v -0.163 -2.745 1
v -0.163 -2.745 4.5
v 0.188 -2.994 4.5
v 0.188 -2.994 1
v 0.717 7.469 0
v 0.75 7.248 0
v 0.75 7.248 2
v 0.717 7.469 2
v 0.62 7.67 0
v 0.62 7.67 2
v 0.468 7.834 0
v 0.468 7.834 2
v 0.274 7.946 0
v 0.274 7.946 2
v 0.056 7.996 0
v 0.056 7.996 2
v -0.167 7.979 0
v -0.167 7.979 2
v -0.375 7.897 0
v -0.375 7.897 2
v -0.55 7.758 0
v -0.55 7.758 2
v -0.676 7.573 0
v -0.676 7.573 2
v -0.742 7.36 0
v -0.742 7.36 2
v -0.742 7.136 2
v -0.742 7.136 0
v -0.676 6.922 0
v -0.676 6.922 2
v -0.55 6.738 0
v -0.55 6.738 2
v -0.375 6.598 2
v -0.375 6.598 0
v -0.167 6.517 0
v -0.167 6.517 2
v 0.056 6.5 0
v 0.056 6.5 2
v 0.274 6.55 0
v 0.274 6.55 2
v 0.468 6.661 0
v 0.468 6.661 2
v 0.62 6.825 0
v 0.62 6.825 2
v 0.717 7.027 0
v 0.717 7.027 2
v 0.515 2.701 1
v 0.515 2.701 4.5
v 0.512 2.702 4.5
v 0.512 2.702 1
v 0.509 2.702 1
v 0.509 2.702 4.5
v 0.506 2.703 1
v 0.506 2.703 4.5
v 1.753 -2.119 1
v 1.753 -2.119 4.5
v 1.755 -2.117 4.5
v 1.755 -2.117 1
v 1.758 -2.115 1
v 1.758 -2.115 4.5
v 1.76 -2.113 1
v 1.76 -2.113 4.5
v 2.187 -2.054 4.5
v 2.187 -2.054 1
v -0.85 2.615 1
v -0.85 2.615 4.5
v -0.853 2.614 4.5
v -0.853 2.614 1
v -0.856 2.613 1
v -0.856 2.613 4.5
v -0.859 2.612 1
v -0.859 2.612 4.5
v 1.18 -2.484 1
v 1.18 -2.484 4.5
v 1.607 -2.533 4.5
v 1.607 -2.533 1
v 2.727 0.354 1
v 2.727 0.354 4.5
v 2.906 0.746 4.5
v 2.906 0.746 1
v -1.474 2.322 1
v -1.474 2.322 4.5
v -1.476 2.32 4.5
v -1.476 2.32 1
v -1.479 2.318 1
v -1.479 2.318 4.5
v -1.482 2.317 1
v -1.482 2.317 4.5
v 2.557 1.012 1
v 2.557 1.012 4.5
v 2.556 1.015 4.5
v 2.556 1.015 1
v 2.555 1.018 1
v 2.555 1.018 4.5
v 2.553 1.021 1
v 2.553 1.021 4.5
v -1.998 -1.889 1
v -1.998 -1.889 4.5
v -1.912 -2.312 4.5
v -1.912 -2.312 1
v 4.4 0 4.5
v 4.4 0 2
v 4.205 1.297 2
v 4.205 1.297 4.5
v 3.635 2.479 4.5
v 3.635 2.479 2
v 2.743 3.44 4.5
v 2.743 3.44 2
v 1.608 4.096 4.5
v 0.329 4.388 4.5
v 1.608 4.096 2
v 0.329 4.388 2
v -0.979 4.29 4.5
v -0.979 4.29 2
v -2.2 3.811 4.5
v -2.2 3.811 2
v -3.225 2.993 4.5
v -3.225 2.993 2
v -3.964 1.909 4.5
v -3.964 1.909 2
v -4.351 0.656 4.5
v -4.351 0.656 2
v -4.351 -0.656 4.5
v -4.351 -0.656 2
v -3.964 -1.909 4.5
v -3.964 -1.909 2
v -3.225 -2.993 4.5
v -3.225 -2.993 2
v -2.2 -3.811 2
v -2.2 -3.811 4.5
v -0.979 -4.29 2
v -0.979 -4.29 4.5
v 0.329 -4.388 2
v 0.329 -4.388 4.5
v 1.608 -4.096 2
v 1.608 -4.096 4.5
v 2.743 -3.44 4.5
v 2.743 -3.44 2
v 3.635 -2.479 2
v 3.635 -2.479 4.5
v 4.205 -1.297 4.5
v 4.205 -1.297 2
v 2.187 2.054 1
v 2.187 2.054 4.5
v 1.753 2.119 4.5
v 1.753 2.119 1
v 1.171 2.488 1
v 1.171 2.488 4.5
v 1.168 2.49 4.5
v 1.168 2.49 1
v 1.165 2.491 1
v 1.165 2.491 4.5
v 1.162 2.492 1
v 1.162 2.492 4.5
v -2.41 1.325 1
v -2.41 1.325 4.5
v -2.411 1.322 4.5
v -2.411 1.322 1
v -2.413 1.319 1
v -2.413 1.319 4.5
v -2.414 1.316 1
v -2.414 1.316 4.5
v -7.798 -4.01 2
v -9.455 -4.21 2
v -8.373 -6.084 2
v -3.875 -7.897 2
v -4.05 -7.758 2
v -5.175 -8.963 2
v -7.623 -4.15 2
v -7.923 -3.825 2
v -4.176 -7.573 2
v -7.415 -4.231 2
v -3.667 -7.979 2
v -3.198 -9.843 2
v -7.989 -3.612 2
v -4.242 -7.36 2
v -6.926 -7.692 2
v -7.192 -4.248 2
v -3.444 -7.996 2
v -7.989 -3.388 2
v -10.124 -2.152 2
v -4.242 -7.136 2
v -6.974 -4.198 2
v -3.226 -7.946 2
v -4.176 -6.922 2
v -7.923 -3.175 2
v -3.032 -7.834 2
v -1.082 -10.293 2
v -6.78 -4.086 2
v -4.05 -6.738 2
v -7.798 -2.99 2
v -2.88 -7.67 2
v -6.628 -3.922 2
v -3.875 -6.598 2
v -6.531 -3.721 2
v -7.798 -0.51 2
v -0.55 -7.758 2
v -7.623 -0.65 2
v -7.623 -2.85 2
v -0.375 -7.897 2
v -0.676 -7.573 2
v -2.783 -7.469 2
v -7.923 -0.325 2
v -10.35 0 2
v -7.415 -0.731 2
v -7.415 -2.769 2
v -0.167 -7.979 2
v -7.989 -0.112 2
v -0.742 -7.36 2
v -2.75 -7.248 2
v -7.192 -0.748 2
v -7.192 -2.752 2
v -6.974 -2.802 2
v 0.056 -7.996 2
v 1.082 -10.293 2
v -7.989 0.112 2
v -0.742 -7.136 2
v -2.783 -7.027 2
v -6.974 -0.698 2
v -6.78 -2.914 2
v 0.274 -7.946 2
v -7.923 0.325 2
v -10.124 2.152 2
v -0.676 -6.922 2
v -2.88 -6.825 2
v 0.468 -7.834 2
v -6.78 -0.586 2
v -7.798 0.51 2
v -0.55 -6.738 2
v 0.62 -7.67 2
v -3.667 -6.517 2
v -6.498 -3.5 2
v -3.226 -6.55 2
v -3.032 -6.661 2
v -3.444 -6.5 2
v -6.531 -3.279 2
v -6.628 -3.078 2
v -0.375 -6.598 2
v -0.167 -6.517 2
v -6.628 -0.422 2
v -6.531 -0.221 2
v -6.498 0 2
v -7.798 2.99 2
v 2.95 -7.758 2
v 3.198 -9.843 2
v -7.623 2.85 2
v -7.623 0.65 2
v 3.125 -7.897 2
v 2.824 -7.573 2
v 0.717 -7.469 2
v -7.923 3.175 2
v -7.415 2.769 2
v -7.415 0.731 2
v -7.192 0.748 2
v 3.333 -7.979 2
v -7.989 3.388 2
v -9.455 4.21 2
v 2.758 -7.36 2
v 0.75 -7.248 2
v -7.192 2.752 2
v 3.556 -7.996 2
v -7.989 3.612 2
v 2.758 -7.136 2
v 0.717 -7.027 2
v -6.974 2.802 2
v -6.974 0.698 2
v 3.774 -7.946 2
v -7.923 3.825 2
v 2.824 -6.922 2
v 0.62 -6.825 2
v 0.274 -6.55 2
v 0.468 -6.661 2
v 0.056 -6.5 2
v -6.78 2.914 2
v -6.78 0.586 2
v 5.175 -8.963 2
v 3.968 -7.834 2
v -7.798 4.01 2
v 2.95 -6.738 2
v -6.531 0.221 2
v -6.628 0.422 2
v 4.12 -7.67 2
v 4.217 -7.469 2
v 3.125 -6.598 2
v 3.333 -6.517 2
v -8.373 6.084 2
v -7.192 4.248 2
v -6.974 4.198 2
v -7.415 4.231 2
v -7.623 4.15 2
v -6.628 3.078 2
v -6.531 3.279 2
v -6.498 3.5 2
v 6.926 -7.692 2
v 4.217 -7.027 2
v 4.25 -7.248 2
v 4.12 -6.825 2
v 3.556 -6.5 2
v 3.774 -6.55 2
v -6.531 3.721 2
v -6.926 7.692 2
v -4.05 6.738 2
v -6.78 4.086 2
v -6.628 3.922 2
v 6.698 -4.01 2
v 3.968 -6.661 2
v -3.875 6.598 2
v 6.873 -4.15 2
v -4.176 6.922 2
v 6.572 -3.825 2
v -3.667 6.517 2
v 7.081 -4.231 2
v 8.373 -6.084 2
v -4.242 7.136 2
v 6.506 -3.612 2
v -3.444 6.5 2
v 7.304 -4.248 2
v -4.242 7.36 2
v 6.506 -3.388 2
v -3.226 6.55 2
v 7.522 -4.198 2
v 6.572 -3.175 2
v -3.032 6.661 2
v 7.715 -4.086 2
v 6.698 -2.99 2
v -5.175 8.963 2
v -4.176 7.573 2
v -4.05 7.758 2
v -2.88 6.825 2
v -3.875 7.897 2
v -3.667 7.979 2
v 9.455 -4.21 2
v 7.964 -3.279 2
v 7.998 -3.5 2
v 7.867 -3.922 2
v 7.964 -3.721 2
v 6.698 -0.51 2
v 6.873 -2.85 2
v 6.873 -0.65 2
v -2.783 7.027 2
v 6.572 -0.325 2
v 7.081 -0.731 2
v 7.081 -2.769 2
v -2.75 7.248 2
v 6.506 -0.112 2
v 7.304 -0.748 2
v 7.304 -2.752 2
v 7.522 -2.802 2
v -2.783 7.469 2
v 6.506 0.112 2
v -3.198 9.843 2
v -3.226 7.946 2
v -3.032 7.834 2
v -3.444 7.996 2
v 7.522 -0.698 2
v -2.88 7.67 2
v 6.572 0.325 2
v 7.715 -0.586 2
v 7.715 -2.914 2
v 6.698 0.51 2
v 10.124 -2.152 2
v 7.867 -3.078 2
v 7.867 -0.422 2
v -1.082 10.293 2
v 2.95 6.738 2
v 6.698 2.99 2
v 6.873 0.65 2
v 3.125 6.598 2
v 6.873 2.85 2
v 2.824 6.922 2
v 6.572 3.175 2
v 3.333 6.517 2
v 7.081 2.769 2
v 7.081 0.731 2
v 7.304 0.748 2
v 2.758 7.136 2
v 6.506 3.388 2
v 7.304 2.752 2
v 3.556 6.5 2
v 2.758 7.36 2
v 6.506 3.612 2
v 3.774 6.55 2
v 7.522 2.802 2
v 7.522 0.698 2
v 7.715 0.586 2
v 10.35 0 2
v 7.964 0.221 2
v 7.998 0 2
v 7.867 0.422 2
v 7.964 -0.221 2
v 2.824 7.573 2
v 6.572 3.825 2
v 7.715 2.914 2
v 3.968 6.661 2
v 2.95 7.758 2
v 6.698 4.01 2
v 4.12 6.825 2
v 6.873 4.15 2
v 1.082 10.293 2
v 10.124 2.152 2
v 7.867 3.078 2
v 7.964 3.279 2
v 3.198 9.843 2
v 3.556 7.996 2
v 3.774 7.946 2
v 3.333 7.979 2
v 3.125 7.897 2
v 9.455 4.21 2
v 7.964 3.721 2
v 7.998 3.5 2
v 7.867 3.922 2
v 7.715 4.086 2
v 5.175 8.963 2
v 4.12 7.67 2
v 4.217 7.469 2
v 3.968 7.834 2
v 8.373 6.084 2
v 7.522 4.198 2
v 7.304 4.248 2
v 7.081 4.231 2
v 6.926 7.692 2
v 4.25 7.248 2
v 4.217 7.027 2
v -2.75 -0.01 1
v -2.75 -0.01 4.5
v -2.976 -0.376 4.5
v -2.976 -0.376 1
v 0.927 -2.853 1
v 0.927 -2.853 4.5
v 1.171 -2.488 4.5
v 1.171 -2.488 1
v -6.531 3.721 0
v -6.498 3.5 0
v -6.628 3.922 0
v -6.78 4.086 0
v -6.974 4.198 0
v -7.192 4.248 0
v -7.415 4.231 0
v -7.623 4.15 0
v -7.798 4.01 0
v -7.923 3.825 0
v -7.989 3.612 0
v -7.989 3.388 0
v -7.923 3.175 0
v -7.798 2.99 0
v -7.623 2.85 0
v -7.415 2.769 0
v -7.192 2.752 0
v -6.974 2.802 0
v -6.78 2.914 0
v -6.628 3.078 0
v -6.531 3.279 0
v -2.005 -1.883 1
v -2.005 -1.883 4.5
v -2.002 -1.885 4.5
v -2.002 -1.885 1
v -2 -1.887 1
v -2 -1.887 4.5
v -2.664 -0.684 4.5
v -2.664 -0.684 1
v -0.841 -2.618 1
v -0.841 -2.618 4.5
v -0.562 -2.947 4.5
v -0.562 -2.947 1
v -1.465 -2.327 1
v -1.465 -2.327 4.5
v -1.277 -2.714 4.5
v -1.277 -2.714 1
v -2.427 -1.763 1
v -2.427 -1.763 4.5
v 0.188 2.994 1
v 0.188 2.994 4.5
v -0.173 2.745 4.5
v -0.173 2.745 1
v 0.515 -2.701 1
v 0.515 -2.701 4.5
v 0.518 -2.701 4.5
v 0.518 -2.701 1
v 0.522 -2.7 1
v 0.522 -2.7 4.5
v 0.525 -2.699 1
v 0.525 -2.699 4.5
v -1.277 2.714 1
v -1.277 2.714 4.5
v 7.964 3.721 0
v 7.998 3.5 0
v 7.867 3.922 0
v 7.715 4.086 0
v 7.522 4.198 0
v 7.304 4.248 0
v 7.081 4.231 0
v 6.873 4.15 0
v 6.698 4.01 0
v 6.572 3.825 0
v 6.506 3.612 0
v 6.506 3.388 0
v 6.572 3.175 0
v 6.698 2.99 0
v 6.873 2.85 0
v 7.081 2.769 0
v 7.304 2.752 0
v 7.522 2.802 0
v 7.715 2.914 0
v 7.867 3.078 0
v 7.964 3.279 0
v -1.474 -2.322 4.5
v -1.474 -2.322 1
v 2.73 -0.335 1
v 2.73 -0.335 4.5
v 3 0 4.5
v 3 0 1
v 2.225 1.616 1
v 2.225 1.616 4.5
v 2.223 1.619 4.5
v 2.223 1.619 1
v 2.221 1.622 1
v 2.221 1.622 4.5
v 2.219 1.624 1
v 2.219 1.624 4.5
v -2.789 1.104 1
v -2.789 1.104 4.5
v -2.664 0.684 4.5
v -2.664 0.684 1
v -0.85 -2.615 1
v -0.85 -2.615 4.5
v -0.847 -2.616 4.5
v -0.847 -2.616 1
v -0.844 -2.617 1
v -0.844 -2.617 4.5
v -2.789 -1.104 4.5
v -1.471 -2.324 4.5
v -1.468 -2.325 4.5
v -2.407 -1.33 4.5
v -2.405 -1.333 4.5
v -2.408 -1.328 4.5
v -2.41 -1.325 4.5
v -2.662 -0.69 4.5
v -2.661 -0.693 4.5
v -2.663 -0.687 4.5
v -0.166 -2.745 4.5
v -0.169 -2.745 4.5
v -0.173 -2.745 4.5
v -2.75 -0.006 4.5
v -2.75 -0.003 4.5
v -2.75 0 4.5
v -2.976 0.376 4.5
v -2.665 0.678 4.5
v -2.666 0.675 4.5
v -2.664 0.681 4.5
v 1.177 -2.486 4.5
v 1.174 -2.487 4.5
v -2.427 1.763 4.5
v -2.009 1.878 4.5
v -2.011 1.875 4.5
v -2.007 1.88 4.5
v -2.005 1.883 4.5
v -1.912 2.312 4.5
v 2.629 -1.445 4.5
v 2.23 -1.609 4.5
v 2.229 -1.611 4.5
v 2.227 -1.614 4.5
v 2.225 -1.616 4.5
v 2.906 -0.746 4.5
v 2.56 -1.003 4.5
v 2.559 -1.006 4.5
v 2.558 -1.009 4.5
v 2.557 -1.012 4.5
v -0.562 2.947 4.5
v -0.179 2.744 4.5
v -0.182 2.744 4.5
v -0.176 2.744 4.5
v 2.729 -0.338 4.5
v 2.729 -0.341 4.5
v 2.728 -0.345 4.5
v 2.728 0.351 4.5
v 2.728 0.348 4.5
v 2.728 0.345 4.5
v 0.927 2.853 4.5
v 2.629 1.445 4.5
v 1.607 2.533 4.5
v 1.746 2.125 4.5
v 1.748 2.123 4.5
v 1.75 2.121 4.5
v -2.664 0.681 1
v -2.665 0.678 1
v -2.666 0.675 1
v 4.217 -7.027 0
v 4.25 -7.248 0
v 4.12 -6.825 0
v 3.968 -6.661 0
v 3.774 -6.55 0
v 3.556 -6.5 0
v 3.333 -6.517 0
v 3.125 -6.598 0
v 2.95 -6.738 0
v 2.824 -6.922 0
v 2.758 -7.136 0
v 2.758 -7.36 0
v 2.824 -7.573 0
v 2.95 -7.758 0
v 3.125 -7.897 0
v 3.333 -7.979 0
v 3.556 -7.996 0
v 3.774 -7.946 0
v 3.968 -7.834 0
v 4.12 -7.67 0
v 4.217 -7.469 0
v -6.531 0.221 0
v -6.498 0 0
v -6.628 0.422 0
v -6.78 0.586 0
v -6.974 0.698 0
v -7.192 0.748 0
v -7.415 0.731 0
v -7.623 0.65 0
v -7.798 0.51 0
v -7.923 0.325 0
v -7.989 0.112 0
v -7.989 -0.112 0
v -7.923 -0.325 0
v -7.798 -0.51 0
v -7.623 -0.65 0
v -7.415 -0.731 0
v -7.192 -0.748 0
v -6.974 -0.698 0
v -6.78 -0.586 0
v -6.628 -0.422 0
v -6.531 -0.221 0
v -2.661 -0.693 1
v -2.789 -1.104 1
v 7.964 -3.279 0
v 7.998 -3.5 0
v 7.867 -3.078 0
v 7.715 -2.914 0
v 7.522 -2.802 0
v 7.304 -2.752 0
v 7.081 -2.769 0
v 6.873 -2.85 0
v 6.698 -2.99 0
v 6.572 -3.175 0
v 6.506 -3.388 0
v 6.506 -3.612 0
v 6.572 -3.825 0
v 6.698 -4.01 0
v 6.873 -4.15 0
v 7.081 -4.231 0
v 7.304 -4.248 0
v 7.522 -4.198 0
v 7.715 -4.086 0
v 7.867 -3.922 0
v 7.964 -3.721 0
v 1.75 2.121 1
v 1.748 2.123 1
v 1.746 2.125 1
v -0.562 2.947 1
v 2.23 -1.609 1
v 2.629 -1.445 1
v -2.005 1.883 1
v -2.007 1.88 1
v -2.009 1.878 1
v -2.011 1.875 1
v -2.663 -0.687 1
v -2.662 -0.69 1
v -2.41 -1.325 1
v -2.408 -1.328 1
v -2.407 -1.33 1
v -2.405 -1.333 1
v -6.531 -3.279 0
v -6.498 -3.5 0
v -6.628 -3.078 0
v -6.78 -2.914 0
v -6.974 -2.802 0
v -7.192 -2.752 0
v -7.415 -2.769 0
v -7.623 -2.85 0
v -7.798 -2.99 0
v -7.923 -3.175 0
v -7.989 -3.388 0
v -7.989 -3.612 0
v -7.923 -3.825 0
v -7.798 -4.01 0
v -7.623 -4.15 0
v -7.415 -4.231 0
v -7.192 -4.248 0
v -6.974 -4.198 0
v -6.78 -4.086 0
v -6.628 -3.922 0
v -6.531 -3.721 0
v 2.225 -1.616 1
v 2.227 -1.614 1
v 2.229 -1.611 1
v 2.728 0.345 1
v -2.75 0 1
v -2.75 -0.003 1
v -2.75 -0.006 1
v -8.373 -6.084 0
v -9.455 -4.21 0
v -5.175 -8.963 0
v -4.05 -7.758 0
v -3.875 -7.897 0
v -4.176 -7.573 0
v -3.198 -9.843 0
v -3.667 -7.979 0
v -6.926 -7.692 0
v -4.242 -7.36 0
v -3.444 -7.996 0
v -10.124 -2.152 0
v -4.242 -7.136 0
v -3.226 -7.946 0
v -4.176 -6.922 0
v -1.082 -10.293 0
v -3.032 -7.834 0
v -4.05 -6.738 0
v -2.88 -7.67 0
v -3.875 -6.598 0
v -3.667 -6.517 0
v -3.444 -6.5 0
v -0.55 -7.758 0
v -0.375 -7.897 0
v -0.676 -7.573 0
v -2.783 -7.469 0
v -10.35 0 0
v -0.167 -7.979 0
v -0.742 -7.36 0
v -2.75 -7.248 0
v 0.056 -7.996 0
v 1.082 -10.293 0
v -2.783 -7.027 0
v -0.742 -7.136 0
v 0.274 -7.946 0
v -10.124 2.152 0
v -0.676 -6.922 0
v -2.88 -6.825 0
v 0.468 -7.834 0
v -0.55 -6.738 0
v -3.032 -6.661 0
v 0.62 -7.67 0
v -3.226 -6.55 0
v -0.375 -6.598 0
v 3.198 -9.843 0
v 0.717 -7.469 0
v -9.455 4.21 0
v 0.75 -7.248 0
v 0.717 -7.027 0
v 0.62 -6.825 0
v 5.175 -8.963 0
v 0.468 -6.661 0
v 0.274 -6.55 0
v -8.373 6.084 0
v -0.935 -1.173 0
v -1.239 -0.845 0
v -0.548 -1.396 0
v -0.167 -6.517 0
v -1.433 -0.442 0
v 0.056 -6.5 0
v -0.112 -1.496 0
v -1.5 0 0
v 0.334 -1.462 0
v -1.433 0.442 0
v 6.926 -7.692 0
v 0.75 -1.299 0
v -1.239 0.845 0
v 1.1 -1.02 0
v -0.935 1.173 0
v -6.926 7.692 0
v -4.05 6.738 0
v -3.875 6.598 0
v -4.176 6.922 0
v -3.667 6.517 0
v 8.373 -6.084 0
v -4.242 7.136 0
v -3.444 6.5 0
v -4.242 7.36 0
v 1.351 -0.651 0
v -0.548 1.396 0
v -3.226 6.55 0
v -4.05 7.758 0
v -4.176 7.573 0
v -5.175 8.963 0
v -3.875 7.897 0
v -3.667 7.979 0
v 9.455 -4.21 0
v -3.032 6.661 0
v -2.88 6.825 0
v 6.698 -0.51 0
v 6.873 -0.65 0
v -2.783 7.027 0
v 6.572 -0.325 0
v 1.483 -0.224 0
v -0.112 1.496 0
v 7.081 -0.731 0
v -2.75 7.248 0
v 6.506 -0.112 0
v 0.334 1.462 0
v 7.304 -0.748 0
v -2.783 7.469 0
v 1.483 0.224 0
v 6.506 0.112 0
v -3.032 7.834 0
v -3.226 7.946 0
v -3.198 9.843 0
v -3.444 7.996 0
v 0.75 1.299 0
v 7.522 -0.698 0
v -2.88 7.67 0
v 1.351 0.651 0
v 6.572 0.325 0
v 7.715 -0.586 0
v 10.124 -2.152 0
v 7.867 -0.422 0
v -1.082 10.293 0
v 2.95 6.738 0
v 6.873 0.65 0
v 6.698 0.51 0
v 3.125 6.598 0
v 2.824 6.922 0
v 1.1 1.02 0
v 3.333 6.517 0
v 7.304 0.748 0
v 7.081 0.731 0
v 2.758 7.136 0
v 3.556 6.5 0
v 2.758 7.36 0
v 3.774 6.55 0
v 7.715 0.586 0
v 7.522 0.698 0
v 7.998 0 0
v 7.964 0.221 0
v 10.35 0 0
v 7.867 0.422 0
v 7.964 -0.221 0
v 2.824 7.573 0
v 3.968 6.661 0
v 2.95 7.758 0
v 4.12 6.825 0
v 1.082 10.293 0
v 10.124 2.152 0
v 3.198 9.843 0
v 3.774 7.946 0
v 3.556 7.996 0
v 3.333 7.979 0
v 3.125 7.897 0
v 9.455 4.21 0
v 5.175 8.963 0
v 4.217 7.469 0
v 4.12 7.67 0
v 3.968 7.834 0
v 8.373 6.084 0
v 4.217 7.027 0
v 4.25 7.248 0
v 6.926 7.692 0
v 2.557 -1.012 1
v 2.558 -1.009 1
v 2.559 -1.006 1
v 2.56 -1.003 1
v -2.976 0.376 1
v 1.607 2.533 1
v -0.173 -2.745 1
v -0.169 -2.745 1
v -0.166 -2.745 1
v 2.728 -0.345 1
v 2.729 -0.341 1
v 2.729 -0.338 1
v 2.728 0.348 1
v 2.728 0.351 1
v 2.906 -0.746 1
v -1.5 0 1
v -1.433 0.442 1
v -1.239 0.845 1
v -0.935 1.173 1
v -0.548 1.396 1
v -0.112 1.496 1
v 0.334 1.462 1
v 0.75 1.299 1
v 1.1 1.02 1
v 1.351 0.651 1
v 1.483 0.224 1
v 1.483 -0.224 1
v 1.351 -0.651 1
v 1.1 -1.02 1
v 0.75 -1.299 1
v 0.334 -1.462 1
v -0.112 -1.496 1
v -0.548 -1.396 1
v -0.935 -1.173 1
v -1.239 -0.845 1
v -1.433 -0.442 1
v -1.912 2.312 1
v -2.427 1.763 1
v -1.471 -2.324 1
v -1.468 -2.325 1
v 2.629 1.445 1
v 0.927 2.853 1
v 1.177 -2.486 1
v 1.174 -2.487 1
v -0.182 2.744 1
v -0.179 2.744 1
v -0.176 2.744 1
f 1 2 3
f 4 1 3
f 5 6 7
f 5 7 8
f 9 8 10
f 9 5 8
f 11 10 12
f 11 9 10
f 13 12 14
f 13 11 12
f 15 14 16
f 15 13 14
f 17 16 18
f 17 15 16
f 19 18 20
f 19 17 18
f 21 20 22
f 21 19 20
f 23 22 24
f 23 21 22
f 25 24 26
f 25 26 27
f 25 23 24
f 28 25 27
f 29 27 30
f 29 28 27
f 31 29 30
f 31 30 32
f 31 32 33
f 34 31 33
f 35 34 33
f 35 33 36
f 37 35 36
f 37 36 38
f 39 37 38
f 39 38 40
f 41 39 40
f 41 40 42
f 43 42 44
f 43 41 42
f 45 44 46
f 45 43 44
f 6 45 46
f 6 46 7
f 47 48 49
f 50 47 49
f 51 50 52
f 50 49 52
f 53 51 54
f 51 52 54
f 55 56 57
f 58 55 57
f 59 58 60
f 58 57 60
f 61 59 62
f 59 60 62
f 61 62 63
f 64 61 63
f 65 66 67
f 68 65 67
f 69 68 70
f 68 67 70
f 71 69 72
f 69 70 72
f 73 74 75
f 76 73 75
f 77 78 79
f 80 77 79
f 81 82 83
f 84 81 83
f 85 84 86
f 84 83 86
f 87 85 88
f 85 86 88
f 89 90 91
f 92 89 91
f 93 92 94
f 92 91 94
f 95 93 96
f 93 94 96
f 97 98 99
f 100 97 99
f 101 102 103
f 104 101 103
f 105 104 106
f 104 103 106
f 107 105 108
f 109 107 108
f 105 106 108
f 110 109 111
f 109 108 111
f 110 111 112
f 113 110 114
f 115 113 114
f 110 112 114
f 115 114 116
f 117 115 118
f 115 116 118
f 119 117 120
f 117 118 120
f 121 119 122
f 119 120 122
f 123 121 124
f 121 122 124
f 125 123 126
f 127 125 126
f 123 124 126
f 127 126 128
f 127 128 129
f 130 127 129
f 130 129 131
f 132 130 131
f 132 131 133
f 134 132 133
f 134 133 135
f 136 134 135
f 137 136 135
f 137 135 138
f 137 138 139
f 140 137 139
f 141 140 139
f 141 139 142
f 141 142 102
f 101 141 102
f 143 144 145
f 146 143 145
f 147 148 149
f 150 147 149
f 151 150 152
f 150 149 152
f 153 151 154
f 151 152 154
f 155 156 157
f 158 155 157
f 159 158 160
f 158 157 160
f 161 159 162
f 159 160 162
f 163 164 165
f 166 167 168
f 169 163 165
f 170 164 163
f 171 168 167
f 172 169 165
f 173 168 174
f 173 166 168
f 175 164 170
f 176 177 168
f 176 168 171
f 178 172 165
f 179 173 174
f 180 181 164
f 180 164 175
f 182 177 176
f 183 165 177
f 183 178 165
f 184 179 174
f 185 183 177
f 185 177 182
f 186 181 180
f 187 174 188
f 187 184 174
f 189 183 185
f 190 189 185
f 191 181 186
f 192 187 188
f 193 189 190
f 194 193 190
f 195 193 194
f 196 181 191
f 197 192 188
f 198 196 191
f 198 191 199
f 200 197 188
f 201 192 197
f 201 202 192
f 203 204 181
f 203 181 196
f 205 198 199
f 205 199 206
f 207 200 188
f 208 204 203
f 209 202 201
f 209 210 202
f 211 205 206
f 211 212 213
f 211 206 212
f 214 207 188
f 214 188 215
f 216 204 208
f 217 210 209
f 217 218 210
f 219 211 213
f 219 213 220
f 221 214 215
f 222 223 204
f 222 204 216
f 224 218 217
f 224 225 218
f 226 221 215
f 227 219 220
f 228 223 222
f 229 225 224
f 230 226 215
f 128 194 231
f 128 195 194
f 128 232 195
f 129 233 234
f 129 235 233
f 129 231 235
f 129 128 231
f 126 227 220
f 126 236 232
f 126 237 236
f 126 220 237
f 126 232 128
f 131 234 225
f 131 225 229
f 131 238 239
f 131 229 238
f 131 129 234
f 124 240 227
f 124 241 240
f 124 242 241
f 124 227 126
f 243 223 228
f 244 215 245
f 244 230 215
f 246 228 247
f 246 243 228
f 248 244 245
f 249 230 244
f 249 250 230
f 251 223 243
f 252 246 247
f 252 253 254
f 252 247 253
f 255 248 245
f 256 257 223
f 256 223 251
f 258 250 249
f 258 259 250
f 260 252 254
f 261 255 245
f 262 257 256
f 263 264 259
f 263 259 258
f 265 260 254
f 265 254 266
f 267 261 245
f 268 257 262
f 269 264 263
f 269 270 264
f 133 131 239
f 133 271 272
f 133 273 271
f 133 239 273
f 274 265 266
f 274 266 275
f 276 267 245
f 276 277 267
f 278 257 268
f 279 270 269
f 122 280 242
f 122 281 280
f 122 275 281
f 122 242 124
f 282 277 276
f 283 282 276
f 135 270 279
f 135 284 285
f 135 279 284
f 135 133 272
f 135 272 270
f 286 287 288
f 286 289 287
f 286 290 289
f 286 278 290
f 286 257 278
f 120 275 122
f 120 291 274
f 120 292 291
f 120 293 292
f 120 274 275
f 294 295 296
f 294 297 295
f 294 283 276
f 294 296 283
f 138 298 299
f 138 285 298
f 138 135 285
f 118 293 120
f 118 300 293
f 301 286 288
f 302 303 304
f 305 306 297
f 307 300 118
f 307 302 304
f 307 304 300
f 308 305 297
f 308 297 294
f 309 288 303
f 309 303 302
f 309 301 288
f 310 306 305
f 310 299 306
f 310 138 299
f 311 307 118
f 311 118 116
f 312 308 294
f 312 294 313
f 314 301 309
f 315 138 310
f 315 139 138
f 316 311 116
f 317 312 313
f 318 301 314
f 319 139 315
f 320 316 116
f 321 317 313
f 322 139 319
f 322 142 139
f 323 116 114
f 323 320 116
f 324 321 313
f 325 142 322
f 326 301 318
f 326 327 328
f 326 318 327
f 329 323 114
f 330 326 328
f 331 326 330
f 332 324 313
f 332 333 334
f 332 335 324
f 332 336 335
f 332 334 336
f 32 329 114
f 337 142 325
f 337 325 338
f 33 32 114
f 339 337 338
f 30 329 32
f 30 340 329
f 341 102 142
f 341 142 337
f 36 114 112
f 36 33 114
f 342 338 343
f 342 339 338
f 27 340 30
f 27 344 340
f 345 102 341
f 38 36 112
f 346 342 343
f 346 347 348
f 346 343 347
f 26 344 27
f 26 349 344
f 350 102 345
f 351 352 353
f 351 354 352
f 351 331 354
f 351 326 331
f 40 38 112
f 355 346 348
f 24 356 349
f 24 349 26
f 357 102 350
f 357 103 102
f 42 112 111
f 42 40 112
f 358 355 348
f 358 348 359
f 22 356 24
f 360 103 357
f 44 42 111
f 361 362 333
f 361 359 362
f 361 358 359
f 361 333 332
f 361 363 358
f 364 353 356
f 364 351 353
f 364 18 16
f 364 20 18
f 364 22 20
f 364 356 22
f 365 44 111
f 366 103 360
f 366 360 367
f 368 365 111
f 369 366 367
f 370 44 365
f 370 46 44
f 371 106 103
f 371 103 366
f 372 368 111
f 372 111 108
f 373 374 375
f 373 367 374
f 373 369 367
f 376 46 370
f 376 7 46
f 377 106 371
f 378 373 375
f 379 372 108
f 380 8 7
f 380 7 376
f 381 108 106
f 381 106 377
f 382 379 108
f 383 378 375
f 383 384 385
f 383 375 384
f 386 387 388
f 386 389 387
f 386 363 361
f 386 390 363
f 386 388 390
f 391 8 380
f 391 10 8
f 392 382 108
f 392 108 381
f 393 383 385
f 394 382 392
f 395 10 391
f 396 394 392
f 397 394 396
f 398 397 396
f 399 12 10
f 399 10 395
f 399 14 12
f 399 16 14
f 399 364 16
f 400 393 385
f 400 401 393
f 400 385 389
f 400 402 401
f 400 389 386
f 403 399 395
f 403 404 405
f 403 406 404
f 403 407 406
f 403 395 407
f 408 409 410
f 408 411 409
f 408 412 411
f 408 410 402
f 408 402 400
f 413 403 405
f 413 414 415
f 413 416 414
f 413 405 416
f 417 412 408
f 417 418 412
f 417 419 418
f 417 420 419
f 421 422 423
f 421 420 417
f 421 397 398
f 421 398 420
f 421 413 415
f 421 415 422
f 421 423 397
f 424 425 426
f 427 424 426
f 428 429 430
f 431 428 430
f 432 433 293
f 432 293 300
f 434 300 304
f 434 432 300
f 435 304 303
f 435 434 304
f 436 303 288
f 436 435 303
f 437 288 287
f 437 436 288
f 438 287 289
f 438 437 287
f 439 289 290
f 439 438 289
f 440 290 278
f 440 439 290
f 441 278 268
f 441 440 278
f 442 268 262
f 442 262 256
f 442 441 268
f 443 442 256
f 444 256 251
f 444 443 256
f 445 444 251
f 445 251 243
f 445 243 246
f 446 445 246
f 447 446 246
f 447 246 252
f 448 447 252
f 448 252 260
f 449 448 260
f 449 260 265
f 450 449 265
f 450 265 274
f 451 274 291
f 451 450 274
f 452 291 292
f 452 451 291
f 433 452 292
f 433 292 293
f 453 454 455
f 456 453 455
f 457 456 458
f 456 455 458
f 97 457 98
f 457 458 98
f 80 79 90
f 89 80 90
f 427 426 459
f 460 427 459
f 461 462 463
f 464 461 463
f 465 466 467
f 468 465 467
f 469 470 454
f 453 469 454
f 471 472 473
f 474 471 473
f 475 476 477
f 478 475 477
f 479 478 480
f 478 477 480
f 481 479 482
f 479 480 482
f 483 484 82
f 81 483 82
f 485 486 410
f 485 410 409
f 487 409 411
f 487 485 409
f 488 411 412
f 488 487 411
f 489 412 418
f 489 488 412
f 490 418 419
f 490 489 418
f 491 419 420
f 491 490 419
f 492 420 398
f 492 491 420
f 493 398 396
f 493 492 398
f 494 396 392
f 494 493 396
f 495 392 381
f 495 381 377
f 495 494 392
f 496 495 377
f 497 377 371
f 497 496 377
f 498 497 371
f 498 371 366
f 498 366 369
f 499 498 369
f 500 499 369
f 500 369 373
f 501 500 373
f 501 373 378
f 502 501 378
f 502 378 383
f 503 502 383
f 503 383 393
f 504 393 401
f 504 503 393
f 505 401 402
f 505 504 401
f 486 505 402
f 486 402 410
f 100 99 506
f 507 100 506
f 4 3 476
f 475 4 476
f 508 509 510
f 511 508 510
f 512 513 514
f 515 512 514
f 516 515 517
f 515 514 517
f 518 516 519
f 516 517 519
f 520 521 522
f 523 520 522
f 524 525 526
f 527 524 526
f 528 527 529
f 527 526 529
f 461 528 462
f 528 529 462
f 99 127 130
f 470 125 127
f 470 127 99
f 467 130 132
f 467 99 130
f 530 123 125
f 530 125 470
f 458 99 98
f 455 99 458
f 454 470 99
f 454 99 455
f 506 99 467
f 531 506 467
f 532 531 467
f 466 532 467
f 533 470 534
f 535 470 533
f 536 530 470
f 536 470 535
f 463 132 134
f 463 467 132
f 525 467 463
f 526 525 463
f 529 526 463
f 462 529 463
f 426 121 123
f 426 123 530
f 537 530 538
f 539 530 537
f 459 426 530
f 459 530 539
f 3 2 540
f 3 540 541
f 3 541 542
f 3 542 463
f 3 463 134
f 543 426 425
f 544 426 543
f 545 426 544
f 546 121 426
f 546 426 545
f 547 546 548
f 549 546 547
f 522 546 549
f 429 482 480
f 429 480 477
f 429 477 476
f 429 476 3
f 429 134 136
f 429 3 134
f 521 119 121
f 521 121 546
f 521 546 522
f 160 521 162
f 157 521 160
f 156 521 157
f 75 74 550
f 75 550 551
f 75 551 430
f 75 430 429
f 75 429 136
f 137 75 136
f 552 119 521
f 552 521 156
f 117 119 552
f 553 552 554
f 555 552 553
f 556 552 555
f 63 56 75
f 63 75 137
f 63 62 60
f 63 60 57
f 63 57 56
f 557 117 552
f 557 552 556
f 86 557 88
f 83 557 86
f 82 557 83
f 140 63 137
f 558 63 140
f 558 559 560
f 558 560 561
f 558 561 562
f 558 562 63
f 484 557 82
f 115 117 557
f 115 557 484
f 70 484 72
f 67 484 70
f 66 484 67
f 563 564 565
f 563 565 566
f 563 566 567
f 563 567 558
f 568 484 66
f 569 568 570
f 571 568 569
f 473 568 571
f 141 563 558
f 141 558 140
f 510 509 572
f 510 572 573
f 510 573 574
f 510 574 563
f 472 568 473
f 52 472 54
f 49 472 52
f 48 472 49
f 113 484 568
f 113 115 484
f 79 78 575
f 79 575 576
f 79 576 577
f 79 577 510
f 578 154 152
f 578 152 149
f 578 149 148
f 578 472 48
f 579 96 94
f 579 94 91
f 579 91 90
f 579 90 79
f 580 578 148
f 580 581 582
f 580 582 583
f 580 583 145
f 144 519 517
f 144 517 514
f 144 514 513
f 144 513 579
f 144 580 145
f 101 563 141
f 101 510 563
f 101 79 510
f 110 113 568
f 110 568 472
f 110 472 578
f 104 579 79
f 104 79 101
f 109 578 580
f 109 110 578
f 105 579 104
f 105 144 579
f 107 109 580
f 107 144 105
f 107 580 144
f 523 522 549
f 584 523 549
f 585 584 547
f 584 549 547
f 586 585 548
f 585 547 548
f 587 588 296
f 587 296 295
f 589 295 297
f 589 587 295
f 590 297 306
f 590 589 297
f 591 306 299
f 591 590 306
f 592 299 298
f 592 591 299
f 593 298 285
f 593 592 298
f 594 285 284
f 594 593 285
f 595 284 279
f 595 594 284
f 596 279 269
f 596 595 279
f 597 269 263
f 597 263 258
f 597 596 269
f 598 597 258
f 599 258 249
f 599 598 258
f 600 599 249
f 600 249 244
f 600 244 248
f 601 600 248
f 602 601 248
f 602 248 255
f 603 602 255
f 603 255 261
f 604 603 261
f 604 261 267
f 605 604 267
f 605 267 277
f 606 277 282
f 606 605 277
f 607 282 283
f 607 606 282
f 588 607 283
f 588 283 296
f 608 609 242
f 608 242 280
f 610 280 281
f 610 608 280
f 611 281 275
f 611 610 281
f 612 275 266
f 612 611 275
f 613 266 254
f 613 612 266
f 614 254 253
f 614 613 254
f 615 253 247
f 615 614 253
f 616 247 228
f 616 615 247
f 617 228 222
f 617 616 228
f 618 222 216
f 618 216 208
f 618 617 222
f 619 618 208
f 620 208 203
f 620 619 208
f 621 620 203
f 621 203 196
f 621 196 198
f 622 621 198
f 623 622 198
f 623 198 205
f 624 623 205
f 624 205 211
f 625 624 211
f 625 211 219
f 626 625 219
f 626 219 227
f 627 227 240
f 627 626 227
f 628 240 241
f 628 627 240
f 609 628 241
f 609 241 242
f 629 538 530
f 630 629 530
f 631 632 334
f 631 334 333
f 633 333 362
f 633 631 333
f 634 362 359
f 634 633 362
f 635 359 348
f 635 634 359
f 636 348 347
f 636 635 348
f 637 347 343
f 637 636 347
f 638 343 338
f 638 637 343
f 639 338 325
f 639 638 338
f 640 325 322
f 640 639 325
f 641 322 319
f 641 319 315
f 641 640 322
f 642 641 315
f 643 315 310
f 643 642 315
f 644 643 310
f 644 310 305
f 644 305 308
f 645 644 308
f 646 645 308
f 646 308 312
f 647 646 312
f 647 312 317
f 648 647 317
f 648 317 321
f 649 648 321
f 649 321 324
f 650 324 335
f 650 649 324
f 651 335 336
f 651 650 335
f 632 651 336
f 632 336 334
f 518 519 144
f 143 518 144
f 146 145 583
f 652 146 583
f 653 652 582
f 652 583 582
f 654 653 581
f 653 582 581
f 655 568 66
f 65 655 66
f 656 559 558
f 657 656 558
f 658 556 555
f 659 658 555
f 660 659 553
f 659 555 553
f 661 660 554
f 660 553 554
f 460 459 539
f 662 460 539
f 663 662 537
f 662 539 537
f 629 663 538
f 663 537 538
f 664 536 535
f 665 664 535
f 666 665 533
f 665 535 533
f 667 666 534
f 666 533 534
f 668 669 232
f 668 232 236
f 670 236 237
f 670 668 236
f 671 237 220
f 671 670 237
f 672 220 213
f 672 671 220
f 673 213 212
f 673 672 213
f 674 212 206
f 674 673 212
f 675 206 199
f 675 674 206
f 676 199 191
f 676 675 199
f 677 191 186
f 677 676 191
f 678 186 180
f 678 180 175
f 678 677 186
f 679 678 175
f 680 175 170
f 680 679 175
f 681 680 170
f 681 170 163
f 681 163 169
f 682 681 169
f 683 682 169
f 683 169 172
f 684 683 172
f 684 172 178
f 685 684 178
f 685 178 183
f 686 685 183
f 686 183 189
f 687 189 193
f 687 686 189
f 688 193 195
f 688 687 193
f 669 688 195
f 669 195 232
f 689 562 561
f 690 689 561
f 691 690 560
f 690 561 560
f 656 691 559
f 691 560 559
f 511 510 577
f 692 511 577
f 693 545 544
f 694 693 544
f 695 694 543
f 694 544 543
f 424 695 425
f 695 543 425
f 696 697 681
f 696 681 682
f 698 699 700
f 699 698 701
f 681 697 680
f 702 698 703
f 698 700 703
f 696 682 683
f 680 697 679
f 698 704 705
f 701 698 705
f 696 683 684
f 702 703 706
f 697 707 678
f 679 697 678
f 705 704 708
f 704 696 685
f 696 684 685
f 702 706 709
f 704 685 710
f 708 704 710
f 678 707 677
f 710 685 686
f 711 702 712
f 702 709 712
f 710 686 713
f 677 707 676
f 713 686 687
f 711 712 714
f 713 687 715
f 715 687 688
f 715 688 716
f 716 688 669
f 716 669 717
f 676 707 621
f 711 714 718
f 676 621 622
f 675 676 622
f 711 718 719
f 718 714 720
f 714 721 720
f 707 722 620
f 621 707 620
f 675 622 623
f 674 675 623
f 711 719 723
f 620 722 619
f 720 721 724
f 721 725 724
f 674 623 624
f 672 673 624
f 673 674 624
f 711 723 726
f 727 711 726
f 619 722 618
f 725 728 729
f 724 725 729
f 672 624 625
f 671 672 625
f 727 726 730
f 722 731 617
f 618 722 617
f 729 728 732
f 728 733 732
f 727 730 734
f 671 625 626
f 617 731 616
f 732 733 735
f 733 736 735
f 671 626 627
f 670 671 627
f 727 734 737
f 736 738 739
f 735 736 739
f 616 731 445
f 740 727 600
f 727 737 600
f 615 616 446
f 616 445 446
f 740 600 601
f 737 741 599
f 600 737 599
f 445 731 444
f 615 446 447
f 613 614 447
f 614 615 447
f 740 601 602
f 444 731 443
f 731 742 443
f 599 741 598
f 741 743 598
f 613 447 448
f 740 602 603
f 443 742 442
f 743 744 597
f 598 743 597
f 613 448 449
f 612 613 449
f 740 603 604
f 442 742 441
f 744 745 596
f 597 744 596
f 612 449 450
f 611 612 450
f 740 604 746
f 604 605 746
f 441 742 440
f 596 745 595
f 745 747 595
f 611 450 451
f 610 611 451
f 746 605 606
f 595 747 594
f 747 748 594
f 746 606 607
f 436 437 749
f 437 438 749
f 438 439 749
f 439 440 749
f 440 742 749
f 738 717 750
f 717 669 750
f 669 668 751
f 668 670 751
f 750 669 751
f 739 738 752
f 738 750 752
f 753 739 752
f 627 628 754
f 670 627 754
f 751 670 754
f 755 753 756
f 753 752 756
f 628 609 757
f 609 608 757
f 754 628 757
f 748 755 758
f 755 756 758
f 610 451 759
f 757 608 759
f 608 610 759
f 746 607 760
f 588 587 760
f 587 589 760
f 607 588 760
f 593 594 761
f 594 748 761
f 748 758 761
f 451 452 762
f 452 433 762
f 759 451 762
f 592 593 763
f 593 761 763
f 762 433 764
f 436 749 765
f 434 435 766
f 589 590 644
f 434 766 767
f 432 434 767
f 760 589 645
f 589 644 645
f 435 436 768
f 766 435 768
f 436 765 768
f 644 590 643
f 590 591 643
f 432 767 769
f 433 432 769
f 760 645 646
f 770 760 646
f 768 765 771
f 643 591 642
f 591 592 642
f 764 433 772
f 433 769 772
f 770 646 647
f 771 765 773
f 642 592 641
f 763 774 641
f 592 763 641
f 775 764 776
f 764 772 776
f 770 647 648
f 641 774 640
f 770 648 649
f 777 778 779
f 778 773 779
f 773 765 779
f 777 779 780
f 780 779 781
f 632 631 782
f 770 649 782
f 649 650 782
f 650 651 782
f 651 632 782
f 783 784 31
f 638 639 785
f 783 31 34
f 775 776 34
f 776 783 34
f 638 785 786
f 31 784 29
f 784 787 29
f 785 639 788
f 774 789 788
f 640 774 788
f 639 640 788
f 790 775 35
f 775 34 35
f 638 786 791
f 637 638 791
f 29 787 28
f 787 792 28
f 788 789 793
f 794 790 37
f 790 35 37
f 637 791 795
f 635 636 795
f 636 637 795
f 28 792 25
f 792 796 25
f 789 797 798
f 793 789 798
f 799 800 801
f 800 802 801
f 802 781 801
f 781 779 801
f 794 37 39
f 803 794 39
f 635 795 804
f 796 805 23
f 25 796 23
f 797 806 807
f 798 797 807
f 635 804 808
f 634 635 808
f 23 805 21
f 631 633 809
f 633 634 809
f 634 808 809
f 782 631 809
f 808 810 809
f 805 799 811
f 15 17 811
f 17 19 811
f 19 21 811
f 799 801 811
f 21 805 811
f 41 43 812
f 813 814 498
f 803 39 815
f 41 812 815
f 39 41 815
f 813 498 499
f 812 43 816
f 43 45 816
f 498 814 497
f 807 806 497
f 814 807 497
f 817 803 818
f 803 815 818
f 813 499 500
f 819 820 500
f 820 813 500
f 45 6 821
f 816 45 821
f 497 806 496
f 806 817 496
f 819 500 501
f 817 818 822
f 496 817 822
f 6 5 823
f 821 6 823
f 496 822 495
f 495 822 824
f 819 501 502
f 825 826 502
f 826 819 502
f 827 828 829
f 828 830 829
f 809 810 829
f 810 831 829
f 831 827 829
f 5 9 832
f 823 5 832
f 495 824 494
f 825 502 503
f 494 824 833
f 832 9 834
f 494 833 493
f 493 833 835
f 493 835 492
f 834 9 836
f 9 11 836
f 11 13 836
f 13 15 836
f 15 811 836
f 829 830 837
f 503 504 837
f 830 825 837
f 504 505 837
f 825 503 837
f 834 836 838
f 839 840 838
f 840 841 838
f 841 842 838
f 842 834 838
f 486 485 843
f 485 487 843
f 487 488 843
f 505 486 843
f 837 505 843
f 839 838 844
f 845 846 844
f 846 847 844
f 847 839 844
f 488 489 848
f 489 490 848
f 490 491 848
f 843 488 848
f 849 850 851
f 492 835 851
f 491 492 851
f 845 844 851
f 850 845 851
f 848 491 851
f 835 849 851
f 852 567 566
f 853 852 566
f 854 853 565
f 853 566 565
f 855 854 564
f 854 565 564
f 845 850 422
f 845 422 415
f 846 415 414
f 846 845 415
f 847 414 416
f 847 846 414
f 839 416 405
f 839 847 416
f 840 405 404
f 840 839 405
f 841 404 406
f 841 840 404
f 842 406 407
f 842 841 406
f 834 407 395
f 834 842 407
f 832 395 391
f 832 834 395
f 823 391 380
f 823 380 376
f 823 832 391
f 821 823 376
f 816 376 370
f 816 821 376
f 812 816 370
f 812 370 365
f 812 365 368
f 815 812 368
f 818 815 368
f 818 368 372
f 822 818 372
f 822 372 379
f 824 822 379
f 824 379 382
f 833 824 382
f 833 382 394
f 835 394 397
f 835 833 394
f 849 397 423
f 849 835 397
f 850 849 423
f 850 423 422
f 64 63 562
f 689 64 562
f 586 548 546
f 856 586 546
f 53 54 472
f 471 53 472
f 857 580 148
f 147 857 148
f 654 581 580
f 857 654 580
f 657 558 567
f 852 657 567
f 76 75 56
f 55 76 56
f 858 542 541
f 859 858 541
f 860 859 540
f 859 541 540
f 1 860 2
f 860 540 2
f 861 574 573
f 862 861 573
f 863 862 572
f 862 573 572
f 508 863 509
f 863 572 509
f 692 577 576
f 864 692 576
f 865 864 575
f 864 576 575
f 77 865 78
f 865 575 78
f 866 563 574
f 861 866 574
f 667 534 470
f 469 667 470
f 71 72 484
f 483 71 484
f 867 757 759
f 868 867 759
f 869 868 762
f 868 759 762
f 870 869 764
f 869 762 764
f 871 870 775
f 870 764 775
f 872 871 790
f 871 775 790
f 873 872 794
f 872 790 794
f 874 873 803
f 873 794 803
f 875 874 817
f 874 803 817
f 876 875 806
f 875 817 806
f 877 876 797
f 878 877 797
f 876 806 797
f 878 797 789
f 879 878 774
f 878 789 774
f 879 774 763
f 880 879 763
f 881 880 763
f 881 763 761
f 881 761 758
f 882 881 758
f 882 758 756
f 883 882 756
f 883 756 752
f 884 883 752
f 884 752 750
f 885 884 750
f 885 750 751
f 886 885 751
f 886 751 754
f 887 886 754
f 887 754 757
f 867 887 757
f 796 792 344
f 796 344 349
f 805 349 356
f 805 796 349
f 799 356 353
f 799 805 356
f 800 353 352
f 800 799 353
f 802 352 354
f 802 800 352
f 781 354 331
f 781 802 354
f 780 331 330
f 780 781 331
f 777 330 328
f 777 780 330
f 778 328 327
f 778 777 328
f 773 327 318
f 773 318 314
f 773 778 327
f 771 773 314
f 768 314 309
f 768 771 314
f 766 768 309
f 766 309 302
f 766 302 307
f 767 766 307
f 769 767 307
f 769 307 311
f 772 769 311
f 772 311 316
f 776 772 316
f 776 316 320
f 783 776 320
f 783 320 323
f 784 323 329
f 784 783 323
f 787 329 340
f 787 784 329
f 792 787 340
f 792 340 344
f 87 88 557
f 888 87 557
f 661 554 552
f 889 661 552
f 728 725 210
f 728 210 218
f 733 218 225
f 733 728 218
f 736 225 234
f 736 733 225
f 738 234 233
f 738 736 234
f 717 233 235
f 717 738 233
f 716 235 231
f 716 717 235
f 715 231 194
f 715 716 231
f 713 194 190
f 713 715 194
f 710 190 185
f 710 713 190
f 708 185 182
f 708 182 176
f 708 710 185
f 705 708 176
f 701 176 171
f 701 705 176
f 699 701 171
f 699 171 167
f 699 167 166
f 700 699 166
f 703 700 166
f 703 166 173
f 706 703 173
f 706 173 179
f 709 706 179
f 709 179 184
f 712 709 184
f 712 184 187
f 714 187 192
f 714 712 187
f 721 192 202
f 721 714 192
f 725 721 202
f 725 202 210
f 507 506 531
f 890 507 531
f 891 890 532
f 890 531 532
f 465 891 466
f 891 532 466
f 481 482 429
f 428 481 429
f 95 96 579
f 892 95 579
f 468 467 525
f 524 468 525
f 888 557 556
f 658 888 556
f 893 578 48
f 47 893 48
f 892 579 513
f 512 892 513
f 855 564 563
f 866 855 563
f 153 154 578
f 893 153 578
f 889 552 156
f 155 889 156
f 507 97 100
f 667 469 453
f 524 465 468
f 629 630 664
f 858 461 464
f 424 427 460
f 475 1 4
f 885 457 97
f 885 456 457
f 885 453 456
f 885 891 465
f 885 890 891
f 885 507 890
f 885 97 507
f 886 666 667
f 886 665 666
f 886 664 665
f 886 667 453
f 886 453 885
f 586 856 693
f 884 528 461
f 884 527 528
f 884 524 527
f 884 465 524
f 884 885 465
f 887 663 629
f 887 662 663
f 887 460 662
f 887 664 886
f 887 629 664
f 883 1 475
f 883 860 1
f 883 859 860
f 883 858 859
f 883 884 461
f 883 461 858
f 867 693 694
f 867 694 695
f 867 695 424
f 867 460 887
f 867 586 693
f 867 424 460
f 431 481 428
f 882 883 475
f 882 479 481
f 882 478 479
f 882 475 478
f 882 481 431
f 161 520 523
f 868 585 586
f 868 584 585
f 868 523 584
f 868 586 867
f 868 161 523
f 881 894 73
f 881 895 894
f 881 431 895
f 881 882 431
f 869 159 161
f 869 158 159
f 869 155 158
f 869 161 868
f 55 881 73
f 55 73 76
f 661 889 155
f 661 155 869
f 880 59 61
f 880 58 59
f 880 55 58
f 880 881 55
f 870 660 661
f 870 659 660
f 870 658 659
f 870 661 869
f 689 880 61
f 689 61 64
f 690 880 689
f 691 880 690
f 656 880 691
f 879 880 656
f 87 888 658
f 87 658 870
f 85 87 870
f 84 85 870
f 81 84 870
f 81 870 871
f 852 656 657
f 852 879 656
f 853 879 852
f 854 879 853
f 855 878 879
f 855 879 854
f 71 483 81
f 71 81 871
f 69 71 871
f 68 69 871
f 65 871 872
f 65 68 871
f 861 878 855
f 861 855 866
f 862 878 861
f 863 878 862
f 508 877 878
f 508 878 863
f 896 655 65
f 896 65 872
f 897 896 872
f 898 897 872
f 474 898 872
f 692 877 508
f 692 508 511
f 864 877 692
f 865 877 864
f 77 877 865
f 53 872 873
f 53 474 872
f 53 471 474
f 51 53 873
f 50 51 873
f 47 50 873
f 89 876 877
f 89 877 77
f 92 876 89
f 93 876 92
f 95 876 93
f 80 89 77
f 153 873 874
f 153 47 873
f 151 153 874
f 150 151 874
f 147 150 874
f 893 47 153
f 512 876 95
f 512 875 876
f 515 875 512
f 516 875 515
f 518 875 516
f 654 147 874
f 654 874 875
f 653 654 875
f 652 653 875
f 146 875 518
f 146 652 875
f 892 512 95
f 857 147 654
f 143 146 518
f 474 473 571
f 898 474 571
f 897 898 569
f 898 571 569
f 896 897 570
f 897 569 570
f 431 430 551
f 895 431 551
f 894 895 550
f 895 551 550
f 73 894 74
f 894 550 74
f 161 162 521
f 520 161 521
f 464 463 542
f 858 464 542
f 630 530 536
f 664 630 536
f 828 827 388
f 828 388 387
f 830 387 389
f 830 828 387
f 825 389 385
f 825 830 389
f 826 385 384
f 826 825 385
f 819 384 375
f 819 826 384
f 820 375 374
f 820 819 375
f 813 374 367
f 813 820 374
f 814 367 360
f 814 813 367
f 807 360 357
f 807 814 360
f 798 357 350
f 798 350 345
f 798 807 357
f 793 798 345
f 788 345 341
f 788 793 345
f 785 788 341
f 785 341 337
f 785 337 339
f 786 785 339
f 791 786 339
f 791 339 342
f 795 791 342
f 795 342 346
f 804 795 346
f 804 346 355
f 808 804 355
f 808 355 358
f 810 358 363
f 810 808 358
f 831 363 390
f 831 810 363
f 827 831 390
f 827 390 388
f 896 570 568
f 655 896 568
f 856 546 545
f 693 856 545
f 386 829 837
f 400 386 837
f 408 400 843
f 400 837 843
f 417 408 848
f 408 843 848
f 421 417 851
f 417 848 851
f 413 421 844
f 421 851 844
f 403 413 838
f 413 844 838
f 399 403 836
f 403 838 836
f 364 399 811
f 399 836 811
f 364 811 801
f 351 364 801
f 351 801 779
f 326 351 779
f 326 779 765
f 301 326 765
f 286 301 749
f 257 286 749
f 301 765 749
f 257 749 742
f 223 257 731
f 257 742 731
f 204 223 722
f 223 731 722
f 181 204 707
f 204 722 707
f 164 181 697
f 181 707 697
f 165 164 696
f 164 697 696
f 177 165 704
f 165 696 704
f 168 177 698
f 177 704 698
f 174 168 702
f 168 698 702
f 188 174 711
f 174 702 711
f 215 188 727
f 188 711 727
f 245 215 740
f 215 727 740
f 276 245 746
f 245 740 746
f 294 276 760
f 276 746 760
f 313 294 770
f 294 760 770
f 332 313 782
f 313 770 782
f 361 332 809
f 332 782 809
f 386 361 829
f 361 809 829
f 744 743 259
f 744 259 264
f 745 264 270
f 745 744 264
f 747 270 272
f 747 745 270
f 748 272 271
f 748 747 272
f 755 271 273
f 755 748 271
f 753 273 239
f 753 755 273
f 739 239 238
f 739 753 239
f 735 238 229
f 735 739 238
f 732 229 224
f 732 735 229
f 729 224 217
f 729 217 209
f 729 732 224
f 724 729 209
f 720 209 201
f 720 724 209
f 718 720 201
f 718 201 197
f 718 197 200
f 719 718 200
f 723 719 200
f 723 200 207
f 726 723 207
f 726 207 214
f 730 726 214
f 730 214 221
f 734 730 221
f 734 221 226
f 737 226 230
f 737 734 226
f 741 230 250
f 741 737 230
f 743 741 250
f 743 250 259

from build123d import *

# Parameters (mm, degrees)
SKETCH1_R             = 10.35
SKETCH1_R_2           = 4.4
SKETCH1_R_3           = 0.75
BOSS_EXTRUDE1_DEPTH   = 2
CIRPATTERN2_OUTLINE_R = 0.75
CIRPATTERN2_DEPTH     = 2
SKETCH1_2_R           = 4.4
BOSS_EXTRUDE2_DEPTH   = 4.5
SKETCH2_R             = 1.5
CUT_EXTRUDE1_DEPTH    = 4.5
SKETCH3_R             = 2.75
CUT_EXTRUDE2_DEPTH    = 3.5
CUT_EXTRUDE3_DEPTH    = 3.5
CIRPATTERN1_COUNT     = 25


# Read off the part's stored shape, not the designer's step: CirPattern2
with BuildPart() as part:
    # Sketch1 → Boss-Extrude1 (new body)
    with BuildSketch(Plane.XY):
        Circle(SKETCH1_R)
        Circle(SKETCH1_R_2, mode=Mode.SUBTRACT)
        with Locations((0, 7.247764581)):
            Circle(SKETCH1_R_3, mode=Mode.SUBTRACT)
        with Locations((3.5, 7.247764581)):
            Circle(SKETCH1_R_3, mode=Mode.SUBTRACT)
        with Locations((-3.5, 7.247764581)):
            Circle(SKETCH1_R_3, mode=Mode.SUBTRACT)
    extrude(amount=BOSS_EXTRUDE1_DEPTH)

    # CirPattern2 outline → CirPattern2 (cut)
    with BuildSketch(Plane.XY):
        with Locations((7.247764581, 3.5)):
            Circle(CIRPATTERN2_OUTLINE_R)
        with Locations((7.247764581, 0)):
            Circle(CIRPATTERN2_OUTLINE_R)
        with Locations((7.247764581, -3.5)):
            Circle(CIRPATTERN2_OUTLINE_R)
        with Locations((3.5, -7.247764581)):
            Circle(CIRPATTERN2_OUTLINE_R)
        with Locations((0, -7.247764581)):
            Circle(CIRPATTERN2_OUTLINE_R)
        with Locations((-3.5, -7.247764581)):
            Circle(CIRPATTERN2_OUTLINE_R)
        with Locations((-7.247764581, -3.5)):
            Circle(CIRPATTERN2_OUTLINE_R)
        with Locations((-7.247764581, 0)):
            Circle(CIRPATTERN2_OUTLINE_R)
        with Locations((-7.247764581, 3.5)):
            Circle(CIRPATTERN2_OUTLINE_R)
    extrude(amount=CIRPATTERN2_DEPTH, mode=Mode.SUBTRACT)

    # Sketch1<2> → Boss-Extrude2 (add)
    with BuildSketch(Plane.XY):
        Circle(SKETCH1_2_R)
    extrude(amount=BOSS_EXTRUDE2_DEPTH)

    # Sketch2 → Cut-Extrude1 (cut)
    with BuildSketch(Plane(origin=(0, 0, 0), x_dir=(-1, 0, 0), z_dir=(0, 0, -1))):
        Circle(SKETCH2_R)
    extrude(amount=-CUT_EXTRUDE1_DEPTH, mode=Mode.SUBTRACT)

    # Sketch3 → Cut-Extrude2 (cut)
    with BuildSketch(Plane.XY.offset(4.5)):
        Circle(SKETCH3_R)
    extrude(amount=-CUT_EXTRUDE2_DEPTH, mode=Mode.SUBTRACT)

    # Sketch4 → Cut-Extrude3 (cut)
    with BuildSketch(Plane.XY.offset(4.5)):
        with BuildLine():
            Line((-2.976344104, 0.375999701), (-2.728315429, 0.344666392))
            ThreePointArc((-2.728315429, 0.344666392), (-2.70218519, 0.510583192), (-2.665974712, 0.674595311))
            Line((-2.665974712, 0.674595311), (-2.976344104, 0.375999701))
        make_face()
        with BuildLine():
            Line((-2.976344104, 0.375999701), (-2.75, 0))
            ThreePointArc((-2.75, 0), (-2.744573503, 0.172673929), (-2.728315429, 0.344666392))
            Line((-2.728315429, 0.344666392), (-2.976344104, 0.375999701))
        make_face()
    cut_extrude3 = extrude(amount=-CUT_EXTRUDE3_DEPTH, mode=Mode.SUBTRACT)

    # CirPattern1: Cut-Extrude3 ×25 about axis
    cirpattern1_axis = Axis((0, 0, 0), (0, 0, 1))
    for i in range(1, CIRPATTERN1_COUNT):
        add(cut_extrude3.rotate(cirpattern1_axis, i * 360 / CIRPATTERN1_COUNT), mode=Mode.SUBTRACT)


solid = part.part
